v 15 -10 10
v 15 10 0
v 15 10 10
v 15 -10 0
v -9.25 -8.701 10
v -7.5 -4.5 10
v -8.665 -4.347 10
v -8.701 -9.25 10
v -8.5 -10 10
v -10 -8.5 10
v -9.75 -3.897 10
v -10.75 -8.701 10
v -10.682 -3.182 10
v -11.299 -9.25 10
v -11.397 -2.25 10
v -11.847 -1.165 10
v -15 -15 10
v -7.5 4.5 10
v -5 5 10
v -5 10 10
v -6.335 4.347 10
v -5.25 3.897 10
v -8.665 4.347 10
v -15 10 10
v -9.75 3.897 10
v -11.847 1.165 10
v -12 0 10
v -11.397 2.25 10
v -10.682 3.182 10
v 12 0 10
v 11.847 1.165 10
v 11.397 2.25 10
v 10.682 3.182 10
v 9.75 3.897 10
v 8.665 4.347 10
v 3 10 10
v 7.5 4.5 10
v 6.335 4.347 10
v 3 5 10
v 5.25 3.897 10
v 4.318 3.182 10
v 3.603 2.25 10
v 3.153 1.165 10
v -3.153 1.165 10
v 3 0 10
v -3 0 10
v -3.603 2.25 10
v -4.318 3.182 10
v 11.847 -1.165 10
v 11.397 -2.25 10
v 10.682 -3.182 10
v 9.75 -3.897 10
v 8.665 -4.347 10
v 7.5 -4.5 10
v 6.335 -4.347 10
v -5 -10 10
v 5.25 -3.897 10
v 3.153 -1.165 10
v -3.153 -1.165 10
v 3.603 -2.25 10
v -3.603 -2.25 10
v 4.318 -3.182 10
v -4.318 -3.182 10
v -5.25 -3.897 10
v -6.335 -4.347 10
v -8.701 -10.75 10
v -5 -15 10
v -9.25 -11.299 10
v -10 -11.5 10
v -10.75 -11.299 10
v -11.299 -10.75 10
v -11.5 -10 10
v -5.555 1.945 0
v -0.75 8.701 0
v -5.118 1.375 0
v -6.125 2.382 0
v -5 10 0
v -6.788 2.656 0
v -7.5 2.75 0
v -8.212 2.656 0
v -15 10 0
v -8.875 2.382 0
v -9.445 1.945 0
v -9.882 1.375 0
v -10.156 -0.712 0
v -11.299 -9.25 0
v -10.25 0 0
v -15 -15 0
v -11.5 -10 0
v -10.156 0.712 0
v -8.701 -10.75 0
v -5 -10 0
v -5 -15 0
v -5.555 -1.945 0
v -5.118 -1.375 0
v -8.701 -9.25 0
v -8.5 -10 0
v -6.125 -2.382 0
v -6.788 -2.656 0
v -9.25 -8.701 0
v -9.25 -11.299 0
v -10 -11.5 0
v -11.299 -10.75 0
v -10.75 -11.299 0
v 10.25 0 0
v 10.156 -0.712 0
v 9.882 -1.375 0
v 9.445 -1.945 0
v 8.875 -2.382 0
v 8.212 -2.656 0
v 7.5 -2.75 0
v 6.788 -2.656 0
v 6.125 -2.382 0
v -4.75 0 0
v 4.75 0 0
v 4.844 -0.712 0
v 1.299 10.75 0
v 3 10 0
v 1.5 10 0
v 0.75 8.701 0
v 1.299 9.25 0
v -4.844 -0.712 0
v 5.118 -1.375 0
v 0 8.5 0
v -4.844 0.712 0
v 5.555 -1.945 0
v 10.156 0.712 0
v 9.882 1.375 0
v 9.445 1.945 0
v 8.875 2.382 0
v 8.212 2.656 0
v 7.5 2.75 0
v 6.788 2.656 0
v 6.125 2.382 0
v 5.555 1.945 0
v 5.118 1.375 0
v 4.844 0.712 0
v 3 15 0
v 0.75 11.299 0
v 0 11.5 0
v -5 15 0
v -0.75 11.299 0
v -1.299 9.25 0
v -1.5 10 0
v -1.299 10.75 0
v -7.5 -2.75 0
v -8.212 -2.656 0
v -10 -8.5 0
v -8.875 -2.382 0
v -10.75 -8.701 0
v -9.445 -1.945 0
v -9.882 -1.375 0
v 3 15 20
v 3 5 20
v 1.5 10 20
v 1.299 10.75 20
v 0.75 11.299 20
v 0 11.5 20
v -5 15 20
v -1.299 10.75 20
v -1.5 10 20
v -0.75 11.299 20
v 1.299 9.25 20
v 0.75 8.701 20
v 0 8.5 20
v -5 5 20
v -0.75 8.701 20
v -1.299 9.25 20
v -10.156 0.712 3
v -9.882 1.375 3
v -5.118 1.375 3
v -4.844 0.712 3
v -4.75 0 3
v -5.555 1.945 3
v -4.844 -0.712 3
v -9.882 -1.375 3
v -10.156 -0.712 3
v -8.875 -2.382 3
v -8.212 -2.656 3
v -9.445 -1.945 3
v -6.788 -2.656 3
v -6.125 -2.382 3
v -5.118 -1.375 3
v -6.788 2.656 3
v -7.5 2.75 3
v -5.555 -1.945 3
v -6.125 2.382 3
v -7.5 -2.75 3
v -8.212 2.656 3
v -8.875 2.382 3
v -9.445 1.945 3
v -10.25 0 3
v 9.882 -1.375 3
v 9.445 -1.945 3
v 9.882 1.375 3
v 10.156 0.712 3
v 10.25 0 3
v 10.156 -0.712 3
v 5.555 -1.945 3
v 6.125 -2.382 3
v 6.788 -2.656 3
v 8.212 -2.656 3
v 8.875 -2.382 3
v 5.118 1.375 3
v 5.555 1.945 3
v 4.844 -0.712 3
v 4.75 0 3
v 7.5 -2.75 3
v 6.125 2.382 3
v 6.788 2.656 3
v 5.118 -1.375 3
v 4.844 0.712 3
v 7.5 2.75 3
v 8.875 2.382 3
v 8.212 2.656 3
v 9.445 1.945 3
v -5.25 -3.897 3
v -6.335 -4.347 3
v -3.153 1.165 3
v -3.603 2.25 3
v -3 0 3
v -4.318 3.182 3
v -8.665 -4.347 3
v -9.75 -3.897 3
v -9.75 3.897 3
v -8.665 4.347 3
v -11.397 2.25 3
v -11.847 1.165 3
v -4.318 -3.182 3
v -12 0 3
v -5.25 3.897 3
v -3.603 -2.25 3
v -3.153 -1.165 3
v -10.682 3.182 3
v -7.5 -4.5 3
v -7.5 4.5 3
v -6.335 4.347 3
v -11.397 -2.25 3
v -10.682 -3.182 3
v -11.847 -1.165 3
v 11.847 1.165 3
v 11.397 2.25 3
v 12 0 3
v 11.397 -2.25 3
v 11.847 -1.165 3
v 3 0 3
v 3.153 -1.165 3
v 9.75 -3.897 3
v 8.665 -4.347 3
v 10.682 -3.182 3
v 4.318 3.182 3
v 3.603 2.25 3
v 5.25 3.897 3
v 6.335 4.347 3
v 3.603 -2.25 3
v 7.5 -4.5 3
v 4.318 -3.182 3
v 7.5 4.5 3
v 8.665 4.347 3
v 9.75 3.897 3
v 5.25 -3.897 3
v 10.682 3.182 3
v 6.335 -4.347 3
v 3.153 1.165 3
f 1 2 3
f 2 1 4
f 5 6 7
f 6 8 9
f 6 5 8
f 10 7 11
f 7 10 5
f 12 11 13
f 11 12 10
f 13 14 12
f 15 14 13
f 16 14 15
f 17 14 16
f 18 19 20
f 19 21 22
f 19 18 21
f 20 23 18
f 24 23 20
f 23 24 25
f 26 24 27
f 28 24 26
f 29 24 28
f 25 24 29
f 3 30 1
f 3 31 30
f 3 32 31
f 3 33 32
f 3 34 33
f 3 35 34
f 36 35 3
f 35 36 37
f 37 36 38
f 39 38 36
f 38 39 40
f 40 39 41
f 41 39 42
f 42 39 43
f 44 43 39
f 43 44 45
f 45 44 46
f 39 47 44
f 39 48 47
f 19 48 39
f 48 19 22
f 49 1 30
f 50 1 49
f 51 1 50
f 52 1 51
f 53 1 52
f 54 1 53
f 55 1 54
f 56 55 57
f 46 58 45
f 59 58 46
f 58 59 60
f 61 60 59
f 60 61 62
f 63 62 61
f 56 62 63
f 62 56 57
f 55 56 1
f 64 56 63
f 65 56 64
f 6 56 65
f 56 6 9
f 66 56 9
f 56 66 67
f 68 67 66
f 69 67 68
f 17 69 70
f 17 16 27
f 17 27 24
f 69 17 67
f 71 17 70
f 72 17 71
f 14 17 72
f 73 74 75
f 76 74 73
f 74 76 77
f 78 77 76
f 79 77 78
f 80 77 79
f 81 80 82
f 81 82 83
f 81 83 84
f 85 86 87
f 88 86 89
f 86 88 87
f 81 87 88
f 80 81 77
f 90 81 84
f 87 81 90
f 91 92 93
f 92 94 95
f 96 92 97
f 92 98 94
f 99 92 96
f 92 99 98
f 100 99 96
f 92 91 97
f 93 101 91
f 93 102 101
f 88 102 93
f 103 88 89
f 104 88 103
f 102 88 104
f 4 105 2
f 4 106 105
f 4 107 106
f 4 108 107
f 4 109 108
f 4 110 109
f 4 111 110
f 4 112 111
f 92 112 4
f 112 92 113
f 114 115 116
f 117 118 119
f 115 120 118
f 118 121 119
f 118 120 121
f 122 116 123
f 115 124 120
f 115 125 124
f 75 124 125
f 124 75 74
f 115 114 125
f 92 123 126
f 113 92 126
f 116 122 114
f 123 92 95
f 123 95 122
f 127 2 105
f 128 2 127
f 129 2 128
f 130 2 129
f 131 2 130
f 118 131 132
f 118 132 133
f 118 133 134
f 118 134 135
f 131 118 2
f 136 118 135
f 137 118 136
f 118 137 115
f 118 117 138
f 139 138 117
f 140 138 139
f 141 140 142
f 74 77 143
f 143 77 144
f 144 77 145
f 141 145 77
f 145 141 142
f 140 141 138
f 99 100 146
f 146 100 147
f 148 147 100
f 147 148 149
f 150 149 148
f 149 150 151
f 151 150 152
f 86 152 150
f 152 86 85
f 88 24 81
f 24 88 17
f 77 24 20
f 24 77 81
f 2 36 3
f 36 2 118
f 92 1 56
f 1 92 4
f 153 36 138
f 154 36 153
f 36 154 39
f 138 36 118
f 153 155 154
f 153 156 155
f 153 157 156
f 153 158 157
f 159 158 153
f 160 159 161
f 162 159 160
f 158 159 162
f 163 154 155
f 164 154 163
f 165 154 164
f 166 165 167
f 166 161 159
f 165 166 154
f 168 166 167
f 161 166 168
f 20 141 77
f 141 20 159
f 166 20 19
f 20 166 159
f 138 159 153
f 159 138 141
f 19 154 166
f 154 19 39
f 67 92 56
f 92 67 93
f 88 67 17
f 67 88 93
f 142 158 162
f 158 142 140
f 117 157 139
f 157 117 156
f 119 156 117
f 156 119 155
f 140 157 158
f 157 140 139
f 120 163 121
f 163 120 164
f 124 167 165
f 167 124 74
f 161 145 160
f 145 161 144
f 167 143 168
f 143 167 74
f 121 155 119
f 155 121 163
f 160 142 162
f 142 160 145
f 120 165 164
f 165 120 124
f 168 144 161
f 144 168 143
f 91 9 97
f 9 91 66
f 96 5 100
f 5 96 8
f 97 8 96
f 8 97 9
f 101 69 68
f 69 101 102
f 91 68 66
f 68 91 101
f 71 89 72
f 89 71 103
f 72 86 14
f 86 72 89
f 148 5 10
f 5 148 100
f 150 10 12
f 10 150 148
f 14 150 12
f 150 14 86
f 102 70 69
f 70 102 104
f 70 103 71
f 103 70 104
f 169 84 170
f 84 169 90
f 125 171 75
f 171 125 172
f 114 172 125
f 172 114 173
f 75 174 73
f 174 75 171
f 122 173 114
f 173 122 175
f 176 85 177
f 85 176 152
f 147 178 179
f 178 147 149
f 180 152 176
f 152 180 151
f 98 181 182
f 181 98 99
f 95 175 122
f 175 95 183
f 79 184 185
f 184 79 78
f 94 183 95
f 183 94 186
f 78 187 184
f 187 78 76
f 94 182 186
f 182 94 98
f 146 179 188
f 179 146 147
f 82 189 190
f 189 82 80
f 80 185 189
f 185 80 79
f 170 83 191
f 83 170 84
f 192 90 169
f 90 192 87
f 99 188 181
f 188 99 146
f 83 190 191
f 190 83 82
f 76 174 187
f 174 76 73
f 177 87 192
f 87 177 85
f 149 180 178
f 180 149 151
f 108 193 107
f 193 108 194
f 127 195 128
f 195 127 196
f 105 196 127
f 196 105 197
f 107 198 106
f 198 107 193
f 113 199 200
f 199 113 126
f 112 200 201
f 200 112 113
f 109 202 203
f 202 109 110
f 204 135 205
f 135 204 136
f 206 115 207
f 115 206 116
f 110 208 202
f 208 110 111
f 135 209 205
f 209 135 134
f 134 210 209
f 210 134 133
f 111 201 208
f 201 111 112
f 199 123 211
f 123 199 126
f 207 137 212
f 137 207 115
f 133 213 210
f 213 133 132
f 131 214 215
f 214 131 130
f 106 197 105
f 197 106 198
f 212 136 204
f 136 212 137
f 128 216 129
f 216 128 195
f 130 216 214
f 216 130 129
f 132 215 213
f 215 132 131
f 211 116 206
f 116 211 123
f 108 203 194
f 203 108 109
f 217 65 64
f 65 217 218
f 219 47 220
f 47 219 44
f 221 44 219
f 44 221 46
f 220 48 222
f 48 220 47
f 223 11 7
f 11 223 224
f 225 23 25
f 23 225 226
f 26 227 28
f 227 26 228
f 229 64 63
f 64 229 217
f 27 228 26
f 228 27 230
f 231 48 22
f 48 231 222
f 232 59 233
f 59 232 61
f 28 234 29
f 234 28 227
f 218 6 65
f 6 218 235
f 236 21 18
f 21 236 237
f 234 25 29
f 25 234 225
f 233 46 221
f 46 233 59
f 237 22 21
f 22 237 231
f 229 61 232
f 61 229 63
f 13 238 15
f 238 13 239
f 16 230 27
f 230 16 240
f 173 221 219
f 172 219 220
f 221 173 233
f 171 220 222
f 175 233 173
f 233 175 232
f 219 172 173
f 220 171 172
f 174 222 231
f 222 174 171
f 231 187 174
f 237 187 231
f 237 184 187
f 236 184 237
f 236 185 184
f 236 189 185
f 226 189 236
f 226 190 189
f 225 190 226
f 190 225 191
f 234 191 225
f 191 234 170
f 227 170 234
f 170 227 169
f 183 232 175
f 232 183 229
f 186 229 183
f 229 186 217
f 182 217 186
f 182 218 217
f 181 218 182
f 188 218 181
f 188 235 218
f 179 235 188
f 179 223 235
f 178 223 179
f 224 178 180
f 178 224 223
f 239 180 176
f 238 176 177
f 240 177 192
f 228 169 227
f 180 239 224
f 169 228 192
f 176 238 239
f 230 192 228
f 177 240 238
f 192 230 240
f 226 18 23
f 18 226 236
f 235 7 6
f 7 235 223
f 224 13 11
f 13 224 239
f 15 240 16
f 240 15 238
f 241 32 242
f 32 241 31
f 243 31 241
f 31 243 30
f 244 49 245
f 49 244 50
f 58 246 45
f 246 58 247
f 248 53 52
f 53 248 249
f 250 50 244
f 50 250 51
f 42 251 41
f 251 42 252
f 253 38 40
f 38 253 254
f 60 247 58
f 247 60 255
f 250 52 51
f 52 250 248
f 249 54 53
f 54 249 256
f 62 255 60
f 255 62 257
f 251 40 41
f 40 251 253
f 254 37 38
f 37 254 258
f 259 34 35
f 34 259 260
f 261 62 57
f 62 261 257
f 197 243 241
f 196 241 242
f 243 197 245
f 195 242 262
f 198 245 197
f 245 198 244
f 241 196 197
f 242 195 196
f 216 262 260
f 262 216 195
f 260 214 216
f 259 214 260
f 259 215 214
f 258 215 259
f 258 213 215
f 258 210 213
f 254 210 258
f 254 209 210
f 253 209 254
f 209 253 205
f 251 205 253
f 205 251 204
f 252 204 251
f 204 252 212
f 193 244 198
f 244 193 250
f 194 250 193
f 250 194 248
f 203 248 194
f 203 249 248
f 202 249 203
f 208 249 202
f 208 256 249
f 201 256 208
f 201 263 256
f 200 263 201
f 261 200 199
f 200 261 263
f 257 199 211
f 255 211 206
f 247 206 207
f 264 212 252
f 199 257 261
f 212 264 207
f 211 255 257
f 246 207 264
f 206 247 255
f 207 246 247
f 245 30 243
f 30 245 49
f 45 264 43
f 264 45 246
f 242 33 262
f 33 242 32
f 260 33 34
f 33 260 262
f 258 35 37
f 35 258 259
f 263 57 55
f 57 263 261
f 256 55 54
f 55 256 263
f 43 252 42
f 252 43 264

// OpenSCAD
difference()
{
    
    union()
    {
        translate([-15,-10,0])
            cube([30,20,10]);
        
        translate([-5,5,0])
            cube([8,10,20]);
        
        translate([-15,-15,0])
            cube([10,10,10]);
    }
    
    union()
    {
        translate([0,10,0])
            cylinder(d=3,h=20,$fn=12);
        translate([-10,-10,0])
            cylinder(d=3,h=20,$fn=12);
        
        translate([-7.5,0,0])
            cylinder(d=5.5,h=20,$fn=24);
        translate([7.5,0,0])
            cylinder(d=5.5,h=20,$fn=24);
        
        translate([-7.5,0,3])
            cylinder(d=9,h=20,$fn=24);
        translate([7.5,0,3])
            cylinder(d=9,h=20,$fn=24);
    }
}
